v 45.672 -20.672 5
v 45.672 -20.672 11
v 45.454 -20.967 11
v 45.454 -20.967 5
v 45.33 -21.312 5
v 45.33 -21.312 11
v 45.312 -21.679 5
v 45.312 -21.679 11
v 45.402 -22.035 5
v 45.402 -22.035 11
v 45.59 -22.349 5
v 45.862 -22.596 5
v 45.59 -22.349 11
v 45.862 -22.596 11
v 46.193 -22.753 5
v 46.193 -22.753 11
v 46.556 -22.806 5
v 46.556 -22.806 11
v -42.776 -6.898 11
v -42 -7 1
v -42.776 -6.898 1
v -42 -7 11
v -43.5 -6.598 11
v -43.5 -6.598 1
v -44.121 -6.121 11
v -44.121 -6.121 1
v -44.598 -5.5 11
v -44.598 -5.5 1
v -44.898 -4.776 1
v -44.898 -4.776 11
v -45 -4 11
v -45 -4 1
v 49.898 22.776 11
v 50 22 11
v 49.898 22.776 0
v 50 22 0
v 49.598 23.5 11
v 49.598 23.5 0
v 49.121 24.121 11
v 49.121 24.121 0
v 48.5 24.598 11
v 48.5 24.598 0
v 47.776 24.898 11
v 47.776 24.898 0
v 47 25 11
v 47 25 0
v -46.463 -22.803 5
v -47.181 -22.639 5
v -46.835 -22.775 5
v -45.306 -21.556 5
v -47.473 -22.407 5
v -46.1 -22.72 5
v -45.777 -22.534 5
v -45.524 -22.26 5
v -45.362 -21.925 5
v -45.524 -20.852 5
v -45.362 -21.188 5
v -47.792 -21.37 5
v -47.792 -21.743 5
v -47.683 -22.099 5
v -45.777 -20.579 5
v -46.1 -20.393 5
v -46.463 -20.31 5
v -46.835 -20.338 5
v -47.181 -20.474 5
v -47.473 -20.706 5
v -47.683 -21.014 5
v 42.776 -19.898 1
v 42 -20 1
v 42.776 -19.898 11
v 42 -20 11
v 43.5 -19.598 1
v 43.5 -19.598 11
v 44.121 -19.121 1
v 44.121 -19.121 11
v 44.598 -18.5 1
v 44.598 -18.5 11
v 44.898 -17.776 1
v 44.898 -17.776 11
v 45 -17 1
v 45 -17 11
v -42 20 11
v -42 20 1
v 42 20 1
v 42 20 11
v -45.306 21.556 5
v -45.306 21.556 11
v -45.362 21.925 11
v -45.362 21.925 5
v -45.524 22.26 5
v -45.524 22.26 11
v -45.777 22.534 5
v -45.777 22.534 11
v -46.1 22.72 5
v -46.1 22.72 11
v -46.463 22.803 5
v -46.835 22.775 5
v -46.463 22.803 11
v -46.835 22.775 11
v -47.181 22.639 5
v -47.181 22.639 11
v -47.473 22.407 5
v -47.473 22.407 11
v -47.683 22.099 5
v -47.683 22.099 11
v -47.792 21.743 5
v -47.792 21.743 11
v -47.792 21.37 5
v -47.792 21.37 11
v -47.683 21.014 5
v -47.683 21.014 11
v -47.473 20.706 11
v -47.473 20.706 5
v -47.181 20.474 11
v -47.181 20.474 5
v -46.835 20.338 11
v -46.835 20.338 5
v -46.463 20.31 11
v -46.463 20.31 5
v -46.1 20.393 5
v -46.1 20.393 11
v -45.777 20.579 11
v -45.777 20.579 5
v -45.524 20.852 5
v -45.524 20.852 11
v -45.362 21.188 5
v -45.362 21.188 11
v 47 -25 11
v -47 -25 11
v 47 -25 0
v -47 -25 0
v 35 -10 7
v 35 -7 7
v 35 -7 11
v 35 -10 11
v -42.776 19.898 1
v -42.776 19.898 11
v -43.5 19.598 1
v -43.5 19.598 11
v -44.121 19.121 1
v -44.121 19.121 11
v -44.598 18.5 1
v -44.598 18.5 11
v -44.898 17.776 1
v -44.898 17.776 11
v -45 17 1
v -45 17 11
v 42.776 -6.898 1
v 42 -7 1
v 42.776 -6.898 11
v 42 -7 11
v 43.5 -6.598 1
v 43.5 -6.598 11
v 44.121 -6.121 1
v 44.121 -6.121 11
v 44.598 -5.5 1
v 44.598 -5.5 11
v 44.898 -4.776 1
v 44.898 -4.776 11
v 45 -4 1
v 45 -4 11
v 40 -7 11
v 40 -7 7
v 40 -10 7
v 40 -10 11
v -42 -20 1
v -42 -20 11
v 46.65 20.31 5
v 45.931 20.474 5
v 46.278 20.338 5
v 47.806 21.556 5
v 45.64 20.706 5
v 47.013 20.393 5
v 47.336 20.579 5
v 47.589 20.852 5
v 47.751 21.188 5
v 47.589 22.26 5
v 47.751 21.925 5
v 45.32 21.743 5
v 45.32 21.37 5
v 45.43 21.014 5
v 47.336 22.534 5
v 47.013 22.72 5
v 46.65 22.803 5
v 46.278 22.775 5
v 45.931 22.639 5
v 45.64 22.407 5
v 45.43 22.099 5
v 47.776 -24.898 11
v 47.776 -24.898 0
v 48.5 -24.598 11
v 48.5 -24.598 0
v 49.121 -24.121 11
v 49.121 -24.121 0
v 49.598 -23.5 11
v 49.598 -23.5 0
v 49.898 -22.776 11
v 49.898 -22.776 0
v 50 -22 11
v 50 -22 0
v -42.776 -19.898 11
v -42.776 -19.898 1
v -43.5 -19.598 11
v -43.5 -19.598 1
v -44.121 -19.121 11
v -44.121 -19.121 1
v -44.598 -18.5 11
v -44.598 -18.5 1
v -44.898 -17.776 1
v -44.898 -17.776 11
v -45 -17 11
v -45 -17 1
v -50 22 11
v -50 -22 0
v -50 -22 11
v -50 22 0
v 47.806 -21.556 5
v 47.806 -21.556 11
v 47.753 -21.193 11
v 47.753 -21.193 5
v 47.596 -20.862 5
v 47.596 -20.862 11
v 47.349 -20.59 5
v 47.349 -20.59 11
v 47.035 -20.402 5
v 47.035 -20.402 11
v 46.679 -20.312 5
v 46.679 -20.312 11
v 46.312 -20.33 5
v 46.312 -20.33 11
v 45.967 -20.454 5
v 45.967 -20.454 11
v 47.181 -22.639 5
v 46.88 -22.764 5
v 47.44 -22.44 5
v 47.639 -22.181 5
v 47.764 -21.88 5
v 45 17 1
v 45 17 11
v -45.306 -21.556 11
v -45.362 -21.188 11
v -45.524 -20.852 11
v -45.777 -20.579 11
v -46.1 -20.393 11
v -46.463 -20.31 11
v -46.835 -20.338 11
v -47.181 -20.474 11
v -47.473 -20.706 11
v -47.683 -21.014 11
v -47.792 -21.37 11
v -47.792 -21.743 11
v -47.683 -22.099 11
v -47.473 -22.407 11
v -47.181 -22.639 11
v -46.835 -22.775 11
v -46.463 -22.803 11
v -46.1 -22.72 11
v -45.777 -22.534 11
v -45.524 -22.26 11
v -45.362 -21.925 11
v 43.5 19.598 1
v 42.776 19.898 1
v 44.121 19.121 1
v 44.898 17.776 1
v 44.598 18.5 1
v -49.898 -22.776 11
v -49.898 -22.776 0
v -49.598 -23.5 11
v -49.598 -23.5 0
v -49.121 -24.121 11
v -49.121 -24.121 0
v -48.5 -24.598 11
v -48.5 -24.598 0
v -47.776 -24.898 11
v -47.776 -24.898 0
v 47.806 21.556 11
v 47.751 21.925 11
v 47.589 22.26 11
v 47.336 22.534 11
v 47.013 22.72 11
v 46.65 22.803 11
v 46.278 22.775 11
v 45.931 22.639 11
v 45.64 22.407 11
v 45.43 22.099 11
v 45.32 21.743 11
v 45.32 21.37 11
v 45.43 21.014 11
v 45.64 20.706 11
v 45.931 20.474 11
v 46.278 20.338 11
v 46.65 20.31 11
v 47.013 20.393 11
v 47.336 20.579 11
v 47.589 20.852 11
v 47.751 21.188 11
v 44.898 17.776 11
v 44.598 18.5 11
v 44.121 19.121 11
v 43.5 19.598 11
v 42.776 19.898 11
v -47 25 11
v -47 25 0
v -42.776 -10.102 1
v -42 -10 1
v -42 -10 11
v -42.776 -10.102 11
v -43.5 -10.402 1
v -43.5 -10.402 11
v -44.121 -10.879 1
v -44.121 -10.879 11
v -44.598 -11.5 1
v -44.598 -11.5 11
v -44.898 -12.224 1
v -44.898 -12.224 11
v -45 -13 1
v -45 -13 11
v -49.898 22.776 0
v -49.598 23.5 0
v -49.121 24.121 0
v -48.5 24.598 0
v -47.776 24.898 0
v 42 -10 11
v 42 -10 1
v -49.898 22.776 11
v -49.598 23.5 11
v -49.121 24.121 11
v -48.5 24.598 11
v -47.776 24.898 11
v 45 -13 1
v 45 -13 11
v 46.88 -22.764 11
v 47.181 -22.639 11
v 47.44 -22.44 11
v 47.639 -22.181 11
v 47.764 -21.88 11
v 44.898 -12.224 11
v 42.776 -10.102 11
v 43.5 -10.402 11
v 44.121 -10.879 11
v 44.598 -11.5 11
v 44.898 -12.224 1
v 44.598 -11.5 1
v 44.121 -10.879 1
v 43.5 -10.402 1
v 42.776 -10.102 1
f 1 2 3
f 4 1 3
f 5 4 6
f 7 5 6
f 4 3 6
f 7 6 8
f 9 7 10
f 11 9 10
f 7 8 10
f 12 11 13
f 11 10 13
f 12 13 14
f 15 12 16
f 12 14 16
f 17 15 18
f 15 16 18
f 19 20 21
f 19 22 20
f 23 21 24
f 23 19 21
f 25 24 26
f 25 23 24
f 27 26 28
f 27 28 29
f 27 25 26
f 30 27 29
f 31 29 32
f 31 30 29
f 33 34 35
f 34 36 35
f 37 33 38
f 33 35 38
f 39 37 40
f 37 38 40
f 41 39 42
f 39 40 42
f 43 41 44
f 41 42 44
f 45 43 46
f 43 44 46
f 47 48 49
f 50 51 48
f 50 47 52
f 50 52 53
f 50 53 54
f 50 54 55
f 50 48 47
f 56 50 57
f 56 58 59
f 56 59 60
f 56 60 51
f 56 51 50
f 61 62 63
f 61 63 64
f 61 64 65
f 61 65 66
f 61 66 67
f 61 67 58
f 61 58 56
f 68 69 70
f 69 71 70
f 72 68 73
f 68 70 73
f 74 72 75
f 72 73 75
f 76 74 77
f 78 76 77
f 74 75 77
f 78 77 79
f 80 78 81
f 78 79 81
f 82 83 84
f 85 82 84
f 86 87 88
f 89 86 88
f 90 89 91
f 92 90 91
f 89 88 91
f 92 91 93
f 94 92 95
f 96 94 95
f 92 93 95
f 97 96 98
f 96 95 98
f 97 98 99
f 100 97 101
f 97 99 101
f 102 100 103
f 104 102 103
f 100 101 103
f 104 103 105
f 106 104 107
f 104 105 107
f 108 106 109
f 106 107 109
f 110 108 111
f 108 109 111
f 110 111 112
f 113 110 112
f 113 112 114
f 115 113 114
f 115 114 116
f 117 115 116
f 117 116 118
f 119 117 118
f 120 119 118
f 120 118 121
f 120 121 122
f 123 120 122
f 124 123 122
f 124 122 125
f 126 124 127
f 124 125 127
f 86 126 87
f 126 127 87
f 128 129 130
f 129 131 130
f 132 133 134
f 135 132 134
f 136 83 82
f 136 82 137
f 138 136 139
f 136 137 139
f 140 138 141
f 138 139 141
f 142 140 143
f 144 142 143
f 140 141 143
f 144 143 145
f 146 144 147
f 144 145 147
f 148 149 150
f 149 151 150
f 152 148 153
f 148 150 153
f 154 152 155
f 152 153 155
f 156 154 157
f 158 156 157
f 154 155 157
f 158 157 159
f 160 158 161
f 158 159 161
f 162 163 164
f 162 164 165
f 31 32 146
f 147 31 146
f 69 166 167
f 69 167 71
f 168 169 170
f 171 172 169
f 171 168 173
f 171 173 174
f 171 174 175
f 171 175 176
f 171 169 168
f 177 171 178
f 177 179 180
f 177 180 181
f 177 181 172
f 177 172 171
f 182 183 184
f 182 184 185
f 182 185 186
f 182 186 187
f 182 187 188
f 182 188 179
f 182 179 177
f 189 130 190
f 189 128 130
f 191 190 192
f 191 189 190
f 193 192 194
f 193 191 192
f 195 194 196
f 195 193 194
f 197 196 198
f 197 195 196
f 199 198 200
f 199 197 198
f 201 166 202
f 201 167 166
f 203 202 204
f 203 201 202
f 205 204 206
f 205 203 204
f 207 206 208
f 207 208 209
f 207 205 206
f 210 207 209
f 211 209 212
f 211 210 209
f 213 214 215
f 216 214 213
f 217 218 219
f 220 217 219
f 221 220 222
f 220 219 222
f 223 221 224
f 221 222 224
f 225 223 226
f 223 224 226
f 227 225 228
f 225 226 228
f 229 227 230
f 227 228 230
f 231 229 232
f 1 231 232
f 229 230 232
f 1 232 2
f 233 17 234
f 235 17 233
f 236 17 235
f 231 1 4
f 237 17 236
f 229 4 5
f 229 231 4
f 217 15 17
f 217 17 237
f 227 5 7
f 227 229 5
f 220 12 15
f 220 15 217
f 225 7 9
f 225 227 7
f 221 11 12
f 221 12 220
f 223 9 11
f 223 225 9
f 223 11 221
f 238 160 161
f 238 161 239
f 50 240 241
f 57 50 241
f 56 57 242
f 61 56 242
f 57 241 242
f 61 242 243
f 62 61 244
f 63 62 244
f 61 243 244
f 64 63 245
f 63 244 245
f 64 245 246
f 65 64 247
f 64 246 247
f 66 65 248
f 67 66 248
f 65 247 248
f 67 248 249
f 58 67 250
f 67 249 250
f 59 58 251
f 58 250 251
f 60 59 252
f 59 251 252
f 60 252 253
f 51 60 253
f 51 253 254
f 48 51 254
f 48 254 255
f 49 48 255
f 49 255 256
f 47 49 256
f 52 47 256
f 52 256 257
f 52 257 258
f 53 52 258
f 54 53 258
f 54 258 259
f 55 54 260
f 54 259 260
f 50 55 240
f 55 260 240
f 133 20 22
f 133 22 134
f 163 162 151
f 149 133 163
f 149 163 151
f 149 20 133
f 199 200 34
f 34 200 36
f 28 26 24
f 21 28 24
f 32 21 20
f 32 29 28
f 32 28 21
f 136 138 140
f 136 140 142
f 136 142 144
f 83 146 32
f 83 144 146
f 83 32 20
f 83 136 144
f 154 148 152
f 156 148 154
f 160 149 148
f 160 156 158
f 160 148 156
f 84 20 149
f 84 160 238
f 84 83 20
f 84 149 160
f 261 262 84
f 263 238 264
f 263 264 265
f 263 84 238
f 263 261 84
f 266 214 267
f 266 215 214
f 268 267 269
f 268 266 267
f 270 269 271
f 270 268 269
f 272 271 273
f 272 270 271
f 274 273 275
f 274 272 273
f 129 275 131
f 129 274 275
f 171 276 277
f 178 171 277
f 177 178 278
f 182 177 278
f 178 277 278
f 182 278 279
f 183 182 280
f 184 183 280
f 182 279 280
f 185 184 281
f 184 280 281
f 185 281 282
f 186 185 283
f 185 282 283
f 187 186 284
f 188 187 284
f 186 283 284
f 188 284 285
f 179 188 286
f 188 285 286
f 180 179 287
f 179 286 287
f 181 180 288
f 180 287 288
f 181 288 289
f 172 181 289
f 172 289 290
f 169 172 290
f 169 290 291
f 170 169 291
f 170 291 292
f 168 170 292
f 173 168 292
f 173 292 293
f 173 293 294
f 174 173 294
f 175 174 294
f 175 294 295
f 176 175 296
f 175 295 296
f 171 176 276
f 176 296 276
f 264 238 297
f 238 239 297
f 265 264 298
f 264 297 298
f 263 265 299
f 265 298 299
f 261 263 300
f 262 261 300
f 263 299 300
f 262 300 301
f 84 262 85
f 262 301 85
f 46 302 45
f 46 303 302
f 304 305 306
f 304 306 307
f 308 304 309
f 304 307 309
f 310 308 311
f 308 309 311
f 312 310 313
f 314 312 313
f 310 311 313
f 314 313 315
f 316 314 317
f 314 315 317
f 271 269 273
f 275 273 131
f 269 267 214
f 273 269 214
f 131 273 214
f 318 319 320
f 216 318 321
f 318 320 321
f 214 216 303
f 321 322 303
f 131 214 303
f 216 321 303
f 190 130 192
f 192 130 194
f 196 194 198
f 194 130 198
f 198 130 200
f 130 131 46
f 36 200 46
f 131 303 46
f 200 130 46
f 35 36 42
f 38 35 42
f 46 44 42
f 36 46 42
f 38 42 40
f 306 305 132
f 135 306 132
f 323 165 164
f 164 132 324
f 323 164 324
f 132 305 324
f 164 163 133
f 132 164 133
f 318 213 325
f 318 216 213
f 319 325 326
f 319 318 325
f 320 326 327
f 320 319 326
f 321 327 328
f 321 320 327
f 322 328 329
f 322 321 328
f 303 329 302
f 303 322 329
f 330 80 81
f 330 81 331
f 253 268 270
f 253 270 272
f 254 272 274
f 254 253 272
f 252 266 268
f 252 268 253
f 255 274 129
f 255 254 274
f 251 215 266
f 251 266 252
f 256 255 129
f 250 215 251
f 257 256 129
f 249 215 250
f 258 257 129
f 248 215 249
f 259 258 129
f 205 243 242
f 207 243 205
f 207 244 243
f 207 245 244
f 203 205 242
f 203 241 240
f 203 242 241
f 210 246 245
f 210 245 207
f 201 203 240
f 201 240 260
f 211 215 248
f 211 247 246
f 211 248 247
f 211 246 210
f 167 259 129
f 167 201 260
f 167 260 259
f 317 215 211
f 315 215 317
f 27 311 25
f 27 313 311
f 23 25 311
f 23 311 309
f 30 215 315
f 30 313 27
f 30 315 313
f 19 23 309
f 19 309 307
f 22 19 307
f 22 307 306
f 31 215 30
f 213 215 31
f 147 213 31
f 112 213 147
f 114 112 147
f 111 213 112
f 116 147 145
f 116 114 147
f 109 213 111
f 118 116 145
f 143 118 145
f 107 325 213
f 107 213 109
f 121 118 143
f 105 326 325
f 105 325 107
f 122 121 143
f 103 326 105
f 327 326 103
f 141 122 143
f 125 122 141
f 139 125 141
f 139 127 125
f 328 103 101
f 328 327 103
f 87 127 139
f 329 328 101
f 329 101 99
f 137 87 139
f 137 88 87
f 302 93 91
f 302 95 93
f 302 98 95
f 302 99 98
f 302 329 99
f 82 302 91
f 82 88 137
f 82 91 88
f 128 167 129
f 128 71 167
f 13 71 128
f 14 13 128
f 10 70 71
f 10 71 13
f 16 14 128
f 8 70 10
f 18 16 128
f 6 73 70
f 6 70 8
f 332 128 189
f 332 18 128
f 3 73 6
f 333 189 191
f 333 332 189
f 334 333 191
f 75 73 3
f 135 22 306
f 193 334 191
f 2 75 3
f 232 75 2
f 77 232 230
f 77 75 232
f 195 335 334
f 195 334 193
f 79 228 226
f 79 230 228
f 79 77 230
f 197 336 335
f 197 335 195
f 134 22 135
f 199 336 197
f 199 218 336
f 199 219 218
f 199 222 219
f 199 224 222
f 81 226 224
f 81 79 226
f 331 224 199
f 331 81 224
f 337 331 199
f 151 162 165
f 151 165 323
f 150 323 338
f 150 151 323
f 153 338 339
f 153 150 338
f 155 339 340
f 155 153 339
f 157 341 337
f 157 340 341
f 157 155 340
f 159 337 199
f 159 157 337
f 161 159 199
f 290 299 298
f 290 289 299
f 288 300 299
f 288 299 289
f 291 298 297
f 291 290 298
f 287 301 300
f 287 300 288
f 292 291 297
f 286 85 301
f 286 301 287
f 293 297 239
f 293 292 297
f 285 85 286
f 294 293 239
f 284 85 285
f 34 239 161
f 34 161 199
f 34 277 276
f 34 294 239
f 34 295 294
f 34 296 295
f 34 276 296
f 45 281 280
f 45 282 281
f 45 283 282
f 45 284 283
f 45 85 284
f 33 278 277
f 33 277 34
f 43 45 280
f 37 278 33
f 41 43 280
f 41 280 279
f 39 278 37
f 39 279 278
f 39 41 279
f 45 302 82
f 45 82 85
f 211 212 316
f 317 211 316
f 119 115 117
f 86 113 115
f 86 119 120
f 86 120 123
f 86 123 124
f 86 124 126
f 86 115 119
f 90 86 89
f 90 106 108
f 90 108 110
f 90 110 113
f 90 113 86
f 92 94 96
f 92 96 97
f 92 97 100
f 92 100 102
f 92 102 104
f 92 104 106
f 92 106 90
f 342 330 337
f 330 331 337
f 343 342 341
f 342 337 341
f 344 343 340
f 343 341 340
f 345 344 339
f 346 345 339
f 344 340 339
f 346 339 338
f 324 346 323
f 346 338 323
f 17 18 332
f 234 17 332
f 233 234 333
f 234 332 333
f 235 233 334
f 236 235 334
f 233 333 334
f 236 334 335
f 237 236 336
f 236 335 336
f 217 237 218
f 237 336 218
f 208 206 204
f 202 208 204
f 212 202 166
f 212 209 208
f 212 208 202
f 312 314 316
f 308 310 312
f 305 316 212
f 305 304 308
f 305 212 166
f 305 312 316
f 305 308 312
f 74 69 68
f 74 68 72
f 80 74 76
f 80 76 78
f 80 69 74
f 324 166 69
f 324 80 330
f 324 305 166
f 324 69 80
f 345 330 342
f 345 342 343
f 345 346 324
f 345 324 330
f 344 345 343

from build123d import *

# Parameters (mm, degrees)
F0_W      = 100
F0_H      = 50
F1_DEPTH  = 1
F2_W      = 100
F2_H      = 50
F2_W_2    = 90
F2_H_2    = 40
F3_DEPTH  = 10
F4_W      = 90
F4_H      = 3
F5_DEPTH  = 11
F6_W      = 5
F6_H      = 4
F7_DEPTH  = 3
F8_R      = 3
F9_R      = 1.25
F10_DEPTH = 6


with BuildPart() as f1:
    # F0 (on Top) → F1 (new body)
    with BuildSketch(Plane.XY):
        Rectangle(F0_W, F0_H)
    extrude(amount=F1_DEPTH)

    # F2 (on face) → F3 (join)
    with BuildSketch(Plane.XY.offset(1)):
        Rectangle(F2_W, F2_H)
        Rectangle(F2_W_2, F2_H_2, mode=Mode.SUBTRACT)
    extrude(amount=F3_DEPTH)

    # F4 (on Top) → F5 (join, through all)
    with BuildSketch(Plane.XY):
        with Locations((0, -8.5)):
            Rectangle(F4_W, F4_H)
    extrude(amount=F5_DEPTH)

    # F6 (on face) → F7 (cut, through all)
    with BuildSketch(Plane(origin=(0, -7, 0), x_dir=(-1, 0, 0), z_dir=(0, 1, 0))):
        with Locations((-37.5, 9)):
            Rectangle(F6_W, F6_H)
    extrude(amount=-F7_DEPTH, mode=Mode.SUBTRACT)

    # F8
    f8_edges = [f1.edges().sort_by_distance(p)[0] for p in [
        (50, -25, 5.5),
        (50, 25, 5.5),
        (-50, -25, 5.5),
        (-50, 25, 5.5),
        (45, -20, 6),
        (-45, -20, 6),
        (45, 20, 6),
        (-45, 20, 6),
        (45, -7, 6),
        (-45, -7, 6),
        (45, -10, 6),
        (-45, -10, 6),
    ]]
    fillet(f8_edges, radius=F8_R)

    # F9 (on face) → F10 (cut)
    with BuildSketch(Plane.XY.offset(11)):
        with BuildLine():
            ThreePointArc((46.556349, -22.806349), (47.440233, -22.440233), (47.806349, -21.556349))
            ThreePointArc((47.806349, -21.556349), (47.034703, -20.4015), (45.672466, -20.672466))
            Line((45.672466, -20.672466), (46.556349, -21.556349))
            Line((46.556349, -21.556349), (46.556349, -22.806349))
        make_face()
        with BuildLine():
            Line((46.556349, -21.556349), (45.672466, -20.672466))
            ThreePointArc((45.672466, -20.672466), (45.4015, -22.034703), (46.556349, -22.806349))
            Line((46.556349, -22.806349), (46.556349, -21.556349))
        make_face()
        with Locations((-46.556349, -21.556349)):
            Circle(F9_R)
        with Locations((-46.556349, 21.556349)):
            Circle(F9_R)
        with Locations((46.556349, 21.556349)):
            Circle(F9_R)
    extrude(amount=-F10_DEPTH, mode=Mode.SUBTRACT)


solid = f1.part
